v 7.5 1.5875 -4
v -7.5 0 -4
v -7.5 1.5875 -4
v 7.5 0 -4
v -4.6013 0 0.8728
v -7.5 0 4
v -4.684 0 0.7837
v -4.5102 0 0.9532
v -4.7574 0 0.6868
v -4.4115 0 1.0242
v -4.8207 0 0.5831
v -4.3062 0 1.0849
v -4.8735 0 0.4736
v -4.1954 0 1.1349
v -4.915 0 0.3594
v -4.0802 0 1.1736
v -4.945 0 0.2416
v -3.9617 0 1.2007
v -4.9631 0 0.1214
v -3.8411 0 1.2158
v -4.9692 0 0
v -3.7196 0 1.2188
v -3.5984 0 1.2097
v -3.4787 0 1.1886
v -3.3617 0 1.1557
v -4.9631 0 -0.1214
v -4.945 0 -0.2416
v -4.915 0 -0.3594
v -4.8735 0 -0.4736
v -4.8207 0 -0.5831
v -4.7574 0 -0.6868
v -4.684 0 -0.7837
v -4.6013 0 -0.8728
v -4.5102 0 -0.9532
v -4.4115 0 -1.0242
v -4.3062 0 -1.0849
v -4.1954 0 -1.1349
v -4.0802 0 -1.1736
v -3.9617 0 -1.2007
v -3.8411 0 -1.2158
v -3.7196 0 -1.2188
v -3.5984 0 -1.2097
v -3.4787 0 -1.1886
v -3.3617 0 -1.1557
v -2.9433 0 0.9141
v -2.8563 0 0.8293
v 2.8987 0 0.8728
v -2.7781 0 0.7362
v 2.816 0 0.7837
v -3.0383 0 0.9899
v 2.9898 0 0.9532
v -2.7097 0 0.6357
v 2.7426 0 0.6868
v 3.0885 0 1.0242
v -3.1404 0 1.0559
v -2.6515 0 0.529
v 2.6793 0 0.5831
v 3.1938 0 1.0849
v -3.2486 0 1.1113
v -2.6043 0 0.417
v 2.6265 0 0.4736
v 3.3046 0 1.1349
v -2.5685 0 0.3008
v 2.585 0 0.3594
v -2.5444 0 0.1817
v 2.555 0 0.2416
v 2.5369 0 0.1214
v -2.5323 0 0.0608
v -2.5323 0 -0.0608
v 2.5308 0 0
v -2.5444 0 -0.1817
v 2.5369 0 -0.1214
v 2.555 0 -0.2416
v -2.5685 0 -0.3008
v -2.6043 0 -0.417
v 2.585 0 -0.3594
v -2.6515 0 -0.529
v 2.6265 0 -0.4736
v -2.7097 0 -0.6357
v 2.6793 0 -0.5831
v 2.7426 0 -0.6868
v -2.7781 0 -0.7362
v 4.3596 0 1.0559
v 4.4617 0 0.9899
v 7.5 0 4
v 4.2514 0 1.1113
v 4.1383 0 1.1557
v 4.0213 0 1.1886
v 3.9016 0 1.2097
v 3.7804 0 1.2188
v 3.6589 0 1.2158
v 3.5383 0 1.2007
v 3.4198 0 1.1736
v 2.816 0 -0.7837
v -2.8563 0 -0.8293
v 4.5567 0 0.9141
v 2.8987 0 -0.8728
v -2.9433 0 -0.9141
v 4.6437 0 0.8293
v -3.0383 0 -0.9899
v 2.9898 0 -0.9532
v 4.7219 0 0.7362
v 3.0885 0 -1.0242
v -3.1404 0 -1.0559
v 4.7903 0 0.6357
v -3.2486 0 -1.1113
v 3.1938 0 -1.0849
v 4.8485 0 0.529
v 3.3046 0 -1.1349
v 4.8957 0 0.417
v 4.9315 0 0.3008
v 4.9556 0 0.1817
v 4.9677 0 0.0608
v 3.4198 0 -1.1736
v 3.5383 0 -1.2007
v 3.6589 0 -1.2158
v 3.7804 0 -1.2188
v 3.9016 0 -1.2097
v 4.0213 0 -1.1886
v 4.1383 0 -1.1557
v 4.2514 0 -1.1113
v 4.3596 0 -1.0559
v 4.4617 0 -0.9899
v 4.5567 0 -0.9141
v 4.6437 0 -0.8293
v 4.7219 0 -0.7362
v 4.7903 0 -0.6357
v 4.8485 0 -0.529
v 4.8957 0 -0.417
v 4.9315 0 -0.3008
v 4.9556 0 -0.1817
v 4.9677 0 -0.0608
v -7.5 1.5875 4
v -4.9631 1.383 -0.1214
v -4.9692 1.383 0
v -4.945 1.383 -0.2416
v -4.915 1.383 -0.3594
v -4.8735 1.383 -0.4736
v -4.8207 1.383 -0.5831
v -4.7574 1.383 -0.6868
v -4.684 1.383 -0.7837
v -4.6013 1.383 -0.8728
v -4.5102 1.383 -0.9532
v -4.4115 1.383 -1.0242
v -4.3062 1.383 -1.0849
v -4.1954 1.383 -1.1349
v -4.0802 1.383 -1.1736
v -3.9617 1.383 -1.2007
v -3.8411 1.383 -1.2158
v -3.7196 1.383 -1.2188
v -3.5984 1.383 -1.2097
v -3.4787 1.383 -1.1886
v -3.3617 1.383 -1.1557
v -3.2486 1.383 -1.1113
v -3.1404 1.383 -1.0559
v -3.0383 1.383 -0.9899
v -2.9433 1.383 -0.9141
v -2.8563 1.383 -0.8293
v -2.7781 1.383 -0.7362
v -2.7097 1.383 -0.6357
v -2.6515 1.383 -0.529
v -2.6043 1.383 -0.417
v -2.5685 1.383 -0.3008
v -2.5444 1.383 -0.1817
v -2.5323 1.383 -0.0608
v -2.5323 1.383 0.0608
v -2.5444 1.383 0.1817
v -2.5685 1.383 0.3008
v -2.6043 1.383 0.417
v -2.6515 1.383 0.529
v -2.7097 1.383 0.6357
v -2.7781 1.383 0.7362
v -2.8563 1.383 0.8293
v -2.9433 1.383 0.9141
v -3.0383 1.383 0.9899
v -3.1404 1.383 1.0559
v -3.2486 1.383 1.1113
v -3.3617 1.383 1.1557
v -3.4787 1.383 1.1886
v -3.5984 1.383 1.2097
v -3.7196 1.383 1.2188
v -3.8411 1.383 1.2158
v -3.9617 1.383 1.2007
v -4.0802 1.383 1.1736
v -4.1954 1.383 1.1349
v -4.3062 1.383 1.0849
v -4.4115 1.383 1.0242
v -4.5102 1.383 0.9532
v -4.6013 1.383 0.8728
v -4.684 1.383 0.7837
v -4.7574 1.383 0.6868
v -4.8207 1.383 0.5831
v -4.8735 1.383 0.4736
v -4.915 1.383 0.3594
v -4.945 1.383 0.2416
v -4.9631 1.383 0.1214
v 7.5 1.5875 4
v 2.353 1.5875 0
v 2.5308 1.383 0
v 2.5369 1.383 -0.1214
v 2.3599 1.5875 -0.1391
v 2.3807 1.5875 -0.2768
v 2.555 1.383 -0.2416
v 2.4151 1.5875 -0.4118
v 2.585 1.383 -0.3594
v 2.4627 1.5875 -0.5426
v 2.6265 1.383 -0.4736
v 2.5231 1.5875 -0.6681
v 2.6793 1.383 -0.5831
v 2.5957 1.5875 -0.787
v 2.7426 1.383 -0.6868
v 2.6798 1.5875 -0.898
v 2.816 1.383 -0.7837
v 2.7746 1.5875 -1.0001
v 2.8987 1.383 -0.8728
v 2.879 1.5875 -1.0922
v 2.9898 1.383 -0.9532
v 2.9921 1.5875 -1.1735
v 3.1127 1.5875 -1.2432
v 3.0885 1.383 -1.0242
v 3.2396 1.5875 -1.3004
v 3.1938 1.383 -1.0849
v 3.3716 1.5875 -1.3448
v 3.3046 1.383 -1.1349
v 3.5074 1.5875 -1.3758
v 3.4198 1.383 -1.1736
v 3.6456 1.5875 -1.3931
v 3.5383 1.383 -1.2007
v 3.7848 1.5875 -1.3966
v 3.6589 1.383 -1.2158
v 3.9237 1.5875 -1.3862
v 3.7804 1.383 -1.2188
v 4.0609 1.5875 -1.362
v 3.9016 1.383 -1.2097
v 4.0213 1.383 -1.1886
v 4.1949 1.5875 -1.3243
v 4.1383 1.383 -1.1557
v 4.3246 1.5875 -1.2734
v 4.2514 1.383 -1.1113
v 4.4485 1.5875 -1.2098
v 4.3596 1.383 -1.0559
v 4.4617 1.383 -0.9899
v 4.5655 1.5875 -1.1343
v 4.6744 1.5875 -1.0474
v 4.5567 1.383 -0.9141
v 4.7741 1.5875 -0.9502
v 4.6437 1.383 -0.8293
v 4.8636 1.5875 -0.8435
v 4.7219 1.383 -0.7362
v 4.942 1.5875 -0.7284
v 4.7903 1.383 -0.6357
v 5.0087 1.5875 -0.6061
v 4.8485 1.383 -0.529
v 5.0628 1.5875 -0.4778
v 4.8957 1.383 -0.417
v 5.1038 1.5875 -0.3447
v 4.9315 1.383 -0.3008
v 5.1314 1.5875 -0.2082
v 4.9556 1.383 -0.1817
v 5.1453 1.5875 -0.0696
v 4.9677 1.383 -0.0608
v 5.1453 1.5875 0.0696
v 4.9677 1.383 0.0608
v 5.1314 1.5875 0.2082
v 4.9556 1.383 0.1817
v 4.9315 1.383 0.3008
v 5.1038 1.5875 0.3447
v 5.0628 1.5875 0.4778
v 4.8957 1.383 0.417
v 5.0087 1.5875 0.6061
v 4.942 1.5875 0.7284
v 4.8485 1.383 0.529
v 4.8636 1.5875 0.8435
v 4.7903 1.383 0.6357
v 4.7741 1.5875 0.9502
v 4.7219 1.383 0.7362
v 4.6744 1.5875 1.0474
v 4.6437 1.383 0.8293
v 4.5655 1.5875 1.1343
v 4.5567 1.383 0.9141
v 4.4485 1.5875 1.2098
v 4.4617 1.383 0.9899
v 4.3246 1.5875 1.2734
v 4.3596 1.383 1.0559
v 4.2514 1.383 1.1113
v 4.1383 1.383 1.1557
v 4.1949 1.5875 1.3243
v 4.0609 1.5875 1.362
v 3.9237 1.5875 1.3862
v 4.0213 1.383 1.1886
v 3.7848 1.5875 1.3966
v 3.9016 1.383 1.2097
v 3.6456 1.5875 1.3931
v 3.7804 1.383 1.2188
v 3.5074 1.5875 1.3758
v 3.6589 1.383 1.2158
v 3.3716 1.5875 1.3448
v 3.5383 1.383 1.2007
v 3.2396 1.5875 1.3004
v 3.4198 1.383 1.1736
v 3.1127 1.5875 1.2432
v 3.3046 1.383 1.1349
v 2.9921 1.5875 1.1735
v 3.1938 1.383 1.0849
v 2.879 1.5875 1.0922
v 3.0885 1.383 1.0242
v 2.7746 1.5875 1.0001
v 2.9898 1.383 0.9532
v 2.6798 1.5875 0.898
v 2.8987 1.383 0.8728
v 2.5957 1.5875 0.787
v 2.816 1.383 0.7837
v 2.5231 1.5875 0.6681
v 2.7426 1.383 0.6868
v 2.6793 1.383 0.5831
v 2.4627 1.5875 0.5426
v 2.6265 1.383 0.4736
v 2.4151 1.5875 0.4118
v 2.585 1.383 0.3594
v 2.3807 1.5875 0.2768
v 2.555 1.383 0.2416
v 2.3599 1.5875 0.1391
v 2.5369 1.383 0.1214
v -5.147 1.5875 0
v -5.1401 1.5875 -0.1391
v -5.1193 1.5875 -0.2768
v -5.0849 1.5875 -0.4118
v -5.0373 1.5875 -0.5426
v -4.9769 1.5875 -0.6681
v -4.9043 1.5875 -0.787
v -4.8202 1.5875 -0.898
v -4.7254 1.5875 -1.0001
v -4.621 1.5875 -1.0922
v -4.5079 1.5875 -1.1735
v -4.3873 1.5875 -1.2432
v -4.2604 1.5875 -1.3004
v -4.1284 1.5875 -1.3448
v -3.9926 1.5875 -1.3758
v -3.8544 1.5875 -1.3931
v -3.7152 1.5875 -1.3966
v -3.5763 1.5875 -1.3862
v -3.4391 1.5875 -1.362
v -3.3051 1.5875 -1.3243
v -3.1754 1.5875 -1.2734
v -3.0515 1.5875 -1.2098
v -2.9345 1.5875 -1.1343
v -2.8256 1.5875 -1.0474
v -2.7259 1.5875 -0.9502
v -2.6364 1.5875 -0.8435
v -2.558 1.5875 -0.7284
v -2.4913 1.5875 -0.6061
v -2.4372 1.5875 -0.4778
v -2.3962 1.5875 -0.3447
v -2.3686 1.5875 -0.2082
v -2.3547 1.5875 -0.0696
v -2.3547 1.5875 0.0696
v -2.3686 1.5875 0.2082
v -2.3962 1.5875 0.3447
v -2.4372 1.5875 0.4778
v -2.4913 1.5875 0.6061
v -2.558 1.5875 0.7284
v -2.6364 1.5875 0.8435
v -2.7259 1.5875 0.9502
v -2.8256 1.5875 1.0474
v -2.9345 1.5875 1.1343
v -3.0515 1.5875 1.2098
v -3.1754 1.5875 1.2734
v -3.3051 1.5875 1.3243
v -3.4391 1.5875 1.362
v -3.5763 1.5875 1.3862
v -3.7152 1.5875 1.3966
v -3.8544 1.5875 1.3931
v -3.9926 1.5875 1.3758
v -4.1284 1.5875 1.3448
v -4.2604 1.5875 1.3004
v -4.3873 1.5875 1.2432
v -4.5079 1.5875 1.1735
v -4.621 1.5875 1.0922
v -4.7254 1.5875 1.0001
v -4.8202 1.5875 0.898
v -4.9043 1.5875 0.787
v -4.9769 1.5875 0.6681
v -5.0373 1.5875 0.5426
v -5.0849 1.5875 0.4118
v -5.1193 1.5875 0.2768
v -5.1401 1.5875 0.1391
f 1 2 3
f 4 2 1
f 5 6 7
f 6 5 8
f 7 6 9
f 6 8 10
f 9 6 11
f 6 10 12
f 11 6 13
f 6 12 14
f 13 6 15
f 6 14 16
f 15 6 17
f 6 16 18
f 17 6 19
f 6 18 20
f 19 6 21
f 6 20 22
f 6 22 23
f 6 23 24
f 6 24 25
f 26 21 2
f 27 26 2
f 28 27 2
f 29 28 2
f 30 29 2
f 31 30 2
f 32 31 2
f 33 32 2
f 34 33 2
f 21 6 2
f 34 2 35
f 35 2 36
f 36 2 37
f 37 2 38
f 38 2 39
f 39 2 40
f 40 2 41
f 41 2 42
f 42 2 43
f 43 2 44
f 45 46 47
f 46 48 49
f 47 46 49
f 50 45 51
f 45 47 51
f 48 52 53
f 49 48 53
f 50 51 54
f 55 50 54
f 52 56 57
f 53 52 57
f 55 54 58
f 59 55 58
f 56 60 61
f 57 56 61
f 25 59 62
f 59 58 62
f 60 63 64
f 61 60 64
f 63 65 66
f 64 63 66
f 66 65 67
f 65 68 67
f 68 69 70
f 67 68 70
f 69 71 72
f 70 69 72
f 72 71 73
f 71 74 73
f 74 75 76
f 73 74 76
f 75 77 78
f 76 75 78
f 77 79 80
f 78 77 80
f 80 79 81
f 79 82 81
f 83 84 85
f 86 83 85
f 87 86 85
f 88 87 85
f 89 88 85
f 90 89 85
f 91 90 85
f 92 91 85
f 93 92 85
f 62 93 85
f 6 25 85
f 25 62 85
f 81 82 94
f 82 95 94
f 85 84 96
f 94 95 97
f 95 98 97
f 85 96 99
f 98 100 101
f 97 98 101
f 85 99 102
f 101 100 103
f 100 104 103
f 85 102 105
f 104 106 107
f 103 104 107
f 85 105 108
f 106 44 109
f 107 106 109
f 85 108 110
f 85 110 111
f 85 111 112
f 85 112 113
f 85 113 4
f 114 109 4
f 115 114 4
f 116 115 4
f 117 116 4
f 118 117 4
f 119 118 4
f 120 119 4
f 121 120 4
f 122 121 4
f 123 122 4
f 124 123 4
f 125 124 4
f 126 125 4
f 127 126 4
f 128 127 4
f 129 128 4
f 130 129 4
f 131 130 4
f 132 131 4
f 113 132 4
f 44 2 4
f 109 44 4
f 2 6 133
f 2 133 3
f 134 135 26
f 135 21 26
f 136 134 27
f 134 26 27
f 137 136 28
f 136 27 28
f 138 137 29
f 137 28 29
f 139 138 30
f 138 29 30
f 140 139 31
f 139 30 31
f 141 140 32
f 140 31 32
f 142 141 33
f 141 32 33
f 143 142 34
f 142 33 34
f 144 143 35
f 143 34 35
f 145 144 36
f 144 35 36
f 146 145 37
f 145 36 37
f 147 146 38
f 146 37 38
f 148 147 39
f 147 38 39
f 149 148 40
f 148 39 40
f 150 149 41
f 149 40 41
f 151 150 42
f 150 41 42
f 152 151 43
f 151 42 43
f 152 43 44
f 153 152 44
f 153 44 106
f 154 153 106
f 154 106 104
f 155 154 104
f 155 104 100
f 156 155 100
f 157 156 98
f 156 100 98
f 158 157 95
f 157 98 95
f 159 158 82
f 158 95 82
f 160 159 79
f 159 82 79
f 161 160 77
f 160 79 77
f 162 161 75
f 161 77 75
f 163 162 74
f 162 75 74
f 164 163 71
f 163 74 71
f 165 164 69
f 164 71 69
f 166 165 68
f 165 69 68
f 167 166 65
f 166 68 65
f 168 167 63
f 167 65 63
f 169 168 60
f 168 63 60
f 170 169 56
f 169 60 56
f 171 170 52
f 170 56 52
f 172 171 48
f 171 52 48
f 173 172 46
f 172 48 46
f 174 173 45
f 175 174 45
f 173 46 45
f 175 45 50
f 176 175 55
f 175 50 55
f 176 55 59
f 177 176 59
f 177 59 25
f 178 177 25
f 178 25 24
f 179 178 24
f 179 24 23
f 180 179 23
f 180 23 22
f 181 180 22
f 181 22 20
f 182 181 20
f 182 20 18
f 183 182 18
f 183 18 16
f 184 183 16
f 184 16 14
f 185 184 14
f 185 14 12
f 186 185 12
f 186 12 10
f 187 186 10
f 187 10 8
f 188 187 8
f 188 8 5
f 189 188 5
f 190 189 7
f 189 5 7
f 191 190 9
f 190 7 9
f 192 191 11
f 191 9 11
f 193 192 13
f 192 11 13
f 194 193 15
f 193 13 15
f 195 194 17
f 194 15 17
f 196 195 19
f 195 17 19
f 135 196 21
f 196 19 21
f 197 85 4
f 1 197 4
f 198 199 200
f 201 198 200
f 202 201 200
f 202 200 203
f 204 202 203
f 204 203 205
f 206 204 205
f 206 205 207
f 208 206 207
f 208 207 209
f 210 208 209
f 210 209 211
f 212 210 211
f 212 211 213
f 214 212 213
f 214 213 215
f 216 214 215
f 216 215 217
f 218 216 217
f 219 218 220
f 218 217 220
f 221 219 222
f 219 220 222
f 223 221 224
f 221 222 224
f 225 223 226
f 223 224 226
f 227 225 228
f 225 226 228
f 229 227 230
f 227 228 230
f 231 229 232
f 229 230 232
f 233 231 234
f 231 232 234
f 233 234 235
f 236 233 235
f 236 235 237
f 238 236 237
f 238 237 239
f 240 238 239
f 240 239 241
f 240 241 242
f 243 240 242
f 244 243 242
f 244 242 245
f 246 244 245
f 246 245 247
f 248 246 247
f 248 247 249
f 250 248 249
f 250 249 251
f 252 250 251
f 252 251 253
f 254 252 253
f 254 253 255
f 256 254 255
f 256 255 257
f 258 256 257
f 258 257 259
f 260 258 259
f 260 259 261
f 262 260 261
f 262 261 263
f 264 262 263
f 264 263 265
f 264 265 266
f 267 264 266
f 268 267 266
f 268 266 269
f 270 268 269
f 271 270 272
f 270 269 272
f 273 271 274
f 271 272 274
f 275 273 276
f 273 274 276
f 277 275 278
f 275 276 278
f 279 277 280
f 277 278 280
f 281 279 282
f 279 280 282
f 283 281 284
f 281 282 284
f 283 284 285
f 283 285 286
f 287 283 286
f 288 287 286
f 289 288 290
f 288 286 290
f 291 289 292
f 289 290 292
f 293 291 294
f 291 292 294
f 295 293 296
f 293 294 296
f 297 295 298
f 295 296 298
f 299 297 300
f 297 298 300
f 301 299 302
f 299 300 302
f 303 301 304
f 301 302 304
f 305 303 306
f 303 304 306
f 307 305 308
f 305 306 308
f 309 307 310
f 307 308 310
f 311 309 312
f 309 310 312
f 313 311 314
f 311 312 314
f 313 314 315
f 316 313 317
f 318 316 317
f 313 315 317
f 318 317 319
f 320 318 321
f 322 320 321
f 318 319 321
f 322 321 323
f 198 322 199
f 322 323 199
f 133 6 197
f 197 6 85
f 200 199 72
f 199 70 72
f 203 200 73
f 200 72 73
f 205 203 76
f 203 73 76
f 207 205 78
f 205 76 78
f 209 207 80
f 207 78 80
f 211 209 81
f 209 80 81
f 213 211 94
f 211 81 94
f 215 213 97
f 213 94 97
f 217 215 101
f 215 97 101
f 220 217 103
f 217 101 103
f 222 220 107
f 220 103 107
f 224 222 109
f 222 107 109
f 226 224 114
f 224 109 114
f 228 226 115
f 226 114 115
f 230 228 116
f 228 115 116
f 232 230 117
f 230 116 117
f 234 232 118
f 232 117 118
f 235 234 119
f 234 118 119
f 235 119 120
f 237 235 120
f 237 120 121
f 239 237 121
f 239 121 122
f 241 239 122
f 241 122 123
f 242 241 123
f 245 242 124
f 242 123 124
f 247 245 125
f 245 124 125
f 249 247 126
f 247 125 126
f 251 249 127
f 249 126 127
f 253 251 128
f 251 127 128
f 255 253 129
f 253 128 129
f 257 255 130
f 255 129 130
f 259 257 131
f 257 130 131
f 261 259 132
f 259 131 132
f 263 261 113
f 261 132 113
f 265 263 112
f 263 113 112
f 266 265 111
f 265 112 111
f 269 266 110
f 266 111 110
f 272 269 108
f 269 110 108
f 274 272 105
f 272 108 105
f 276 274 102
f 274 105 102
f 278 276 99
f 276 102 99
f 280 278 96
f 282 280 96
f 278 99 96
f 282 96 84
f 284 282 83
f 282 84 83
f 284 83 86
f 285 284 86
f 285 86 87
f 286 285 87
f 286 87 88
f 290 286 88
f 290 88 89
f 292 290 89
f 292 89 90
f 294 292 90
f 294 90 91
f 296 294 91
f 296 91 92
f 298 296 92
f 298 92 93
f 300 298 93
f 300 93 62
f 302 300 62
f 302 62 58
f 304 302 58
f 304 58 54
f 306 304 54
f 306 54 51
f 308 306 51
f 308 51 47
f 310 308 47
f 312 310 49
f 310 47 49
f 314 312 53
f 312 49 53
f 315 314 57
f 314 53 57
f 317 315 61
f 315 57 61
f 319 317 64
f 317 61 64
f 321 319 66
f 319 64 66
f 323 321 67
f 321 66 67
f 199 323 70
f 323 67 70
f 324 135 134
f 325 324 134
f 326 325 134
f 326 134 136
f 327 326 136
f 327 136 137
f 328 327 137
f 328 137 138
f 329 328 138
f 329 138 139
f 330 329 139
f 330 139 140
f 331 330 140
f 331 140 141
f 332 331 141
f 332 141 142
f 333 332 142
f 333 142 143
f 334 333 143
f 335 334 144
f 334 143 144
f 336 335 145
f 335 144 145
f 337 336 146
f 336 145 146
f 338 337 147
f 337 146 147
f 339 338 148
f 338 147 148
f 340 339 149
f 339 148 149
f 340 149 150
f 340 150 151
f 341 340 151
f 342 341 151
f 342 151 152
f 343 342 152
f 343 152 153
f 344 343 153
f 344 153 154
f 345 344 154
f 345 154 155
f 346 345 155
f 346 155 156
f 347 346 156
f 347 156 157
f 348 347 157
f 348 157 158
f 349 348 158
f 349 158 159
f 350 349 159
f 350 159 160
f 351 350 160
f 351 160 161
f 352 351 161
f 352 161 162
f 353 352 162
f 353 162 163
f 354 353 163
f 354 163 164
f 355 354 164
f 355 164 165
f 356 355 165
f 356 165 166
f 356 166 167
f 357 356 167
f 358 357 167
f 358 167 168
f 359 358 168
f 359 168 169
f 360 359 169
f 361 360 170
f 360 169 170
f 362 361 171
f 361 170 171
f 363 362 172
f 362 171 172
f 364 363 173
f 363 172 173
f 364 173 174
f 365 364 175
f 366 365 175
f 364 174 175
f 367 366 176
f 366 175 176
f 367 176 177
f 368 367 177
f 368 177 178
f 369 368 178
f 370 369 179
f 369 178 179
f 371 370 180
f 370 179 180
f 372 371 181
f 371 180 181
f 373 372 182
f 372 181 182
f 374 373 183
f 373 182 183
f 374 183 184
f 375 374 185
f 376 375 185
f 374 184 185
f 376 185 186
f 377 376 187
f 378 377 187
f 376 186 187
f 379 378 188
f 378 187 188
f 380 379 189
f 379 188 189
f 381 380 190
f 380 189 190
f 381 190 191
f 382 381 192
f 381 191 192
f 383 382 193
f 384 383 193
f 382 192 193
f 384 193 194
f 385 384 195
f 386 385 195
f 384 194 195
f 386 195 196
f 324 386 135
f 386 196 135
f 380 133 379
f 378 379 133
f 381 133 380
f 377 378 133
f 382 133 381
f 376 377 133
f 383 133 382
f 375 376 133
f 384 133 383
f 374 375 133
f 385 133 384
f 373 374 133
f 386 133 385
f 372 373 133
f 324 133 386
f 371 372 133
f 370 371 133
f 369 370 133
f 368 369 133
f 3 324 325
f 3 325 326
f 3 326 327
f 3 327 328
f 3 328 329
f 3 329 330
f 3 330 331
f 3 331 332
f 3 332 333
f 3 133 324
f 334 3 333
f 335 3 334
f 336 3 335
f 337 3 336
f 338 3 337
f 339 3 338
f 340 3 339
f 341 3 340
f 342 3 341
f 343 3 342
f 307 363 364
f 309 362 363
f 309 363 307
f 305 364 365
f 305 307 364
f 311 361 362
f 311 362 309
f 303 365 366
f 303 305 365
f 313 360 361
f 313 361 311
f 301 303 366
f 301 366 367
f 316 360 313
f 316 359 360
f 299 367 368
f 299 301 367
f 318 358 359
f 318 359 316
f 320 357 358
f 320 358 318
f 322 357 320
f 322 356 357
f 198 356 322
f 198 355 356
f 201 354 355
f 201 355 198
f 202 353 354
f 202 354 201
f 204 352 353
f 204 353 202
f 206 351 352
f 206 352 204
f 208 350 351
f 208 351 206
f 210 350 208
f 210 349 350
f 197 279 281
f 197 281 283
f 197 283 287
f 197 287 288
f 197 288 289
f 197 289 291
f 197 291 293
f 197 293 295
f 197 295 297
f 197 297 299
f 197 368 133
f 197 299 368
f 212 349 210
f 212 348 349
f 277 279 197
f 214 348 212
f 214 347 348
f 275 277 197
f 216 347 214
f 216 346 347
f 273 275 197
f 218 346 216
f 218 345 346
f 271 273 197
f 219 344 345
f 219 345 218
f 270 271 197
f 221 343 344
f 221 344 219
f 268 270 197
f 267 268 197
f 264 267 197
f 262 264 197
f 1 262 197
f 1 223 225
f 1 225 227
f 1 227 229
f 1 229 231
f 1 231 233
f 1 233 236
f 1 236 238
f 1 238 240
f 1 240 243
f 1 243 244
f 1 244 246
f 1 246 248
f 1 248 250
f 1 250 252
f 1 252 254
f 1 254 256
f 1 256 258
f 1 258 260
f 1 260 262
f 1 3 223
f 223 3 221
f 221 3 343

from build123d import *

# Parameters (mm, degrees)
SKETCH1_W                       = 15
SKETCH1_H                       = 8
BOSS_EXTRUDE1_DEPTH             = 1.5875
F_2_CLEARANCE_HOLE1_D           = 2.4384
F_2_CLEARANCE_HOLE1_DEPTH       = 64.75
F_2_CLEARANCE_HOLE1_CSINK_D     = 2.794
F_2_CLEARANCE_HOLE1_CSINK_ANGLE = 82
F_2_CLEARANCE_HOLE1_TIP         = 0.732569267


with BuildPart() as part:
    # Sketch1 → Boss-Extrude1 (new body)
    with BuildSketch(Plane(origin=(0, 0, 0), x_dir=(1, 0, 0), z_dir=(0, 1, 0))):
        Rectangle(SKETCH1_W, SKETCH1_H)
    extrude(amount=BOSS_EXTRUDE1_DEPTH)

    # #2 Clearance Hole1
    with Locations(Plane(origin=(0, 1.5875, 0), x_dir=(1, 0, 0), z_dir=(0, 1, 0))):
        with Locations((-3.75, 0), (3.75, 0)):
            CounterSinkHole(F_2_CLEARANCE_HOLE1_D / 2, F_2_CLEARANCE_HOLE1_CSINK_D / 2, depth=F_2_CLEARANCE_HOLE1_DEPTH, counter_sink_angle=F_2_CLEARANCE_HOLE1_CSINK_ANGLE)
            with Locations((0, 0, -(F_2_CLEARANCE_HOLE1_DEPTH + F_2_CLEARANCE_HOLE1_TIP / 2))):  # 118° drill point
                Cone(0, F_2_CLEARANCE_HOLE1_D / 2, F_2_CLEARANCE_HOLE1_TIP, mode=Mode.SUBTRACT)


solid = part.part
